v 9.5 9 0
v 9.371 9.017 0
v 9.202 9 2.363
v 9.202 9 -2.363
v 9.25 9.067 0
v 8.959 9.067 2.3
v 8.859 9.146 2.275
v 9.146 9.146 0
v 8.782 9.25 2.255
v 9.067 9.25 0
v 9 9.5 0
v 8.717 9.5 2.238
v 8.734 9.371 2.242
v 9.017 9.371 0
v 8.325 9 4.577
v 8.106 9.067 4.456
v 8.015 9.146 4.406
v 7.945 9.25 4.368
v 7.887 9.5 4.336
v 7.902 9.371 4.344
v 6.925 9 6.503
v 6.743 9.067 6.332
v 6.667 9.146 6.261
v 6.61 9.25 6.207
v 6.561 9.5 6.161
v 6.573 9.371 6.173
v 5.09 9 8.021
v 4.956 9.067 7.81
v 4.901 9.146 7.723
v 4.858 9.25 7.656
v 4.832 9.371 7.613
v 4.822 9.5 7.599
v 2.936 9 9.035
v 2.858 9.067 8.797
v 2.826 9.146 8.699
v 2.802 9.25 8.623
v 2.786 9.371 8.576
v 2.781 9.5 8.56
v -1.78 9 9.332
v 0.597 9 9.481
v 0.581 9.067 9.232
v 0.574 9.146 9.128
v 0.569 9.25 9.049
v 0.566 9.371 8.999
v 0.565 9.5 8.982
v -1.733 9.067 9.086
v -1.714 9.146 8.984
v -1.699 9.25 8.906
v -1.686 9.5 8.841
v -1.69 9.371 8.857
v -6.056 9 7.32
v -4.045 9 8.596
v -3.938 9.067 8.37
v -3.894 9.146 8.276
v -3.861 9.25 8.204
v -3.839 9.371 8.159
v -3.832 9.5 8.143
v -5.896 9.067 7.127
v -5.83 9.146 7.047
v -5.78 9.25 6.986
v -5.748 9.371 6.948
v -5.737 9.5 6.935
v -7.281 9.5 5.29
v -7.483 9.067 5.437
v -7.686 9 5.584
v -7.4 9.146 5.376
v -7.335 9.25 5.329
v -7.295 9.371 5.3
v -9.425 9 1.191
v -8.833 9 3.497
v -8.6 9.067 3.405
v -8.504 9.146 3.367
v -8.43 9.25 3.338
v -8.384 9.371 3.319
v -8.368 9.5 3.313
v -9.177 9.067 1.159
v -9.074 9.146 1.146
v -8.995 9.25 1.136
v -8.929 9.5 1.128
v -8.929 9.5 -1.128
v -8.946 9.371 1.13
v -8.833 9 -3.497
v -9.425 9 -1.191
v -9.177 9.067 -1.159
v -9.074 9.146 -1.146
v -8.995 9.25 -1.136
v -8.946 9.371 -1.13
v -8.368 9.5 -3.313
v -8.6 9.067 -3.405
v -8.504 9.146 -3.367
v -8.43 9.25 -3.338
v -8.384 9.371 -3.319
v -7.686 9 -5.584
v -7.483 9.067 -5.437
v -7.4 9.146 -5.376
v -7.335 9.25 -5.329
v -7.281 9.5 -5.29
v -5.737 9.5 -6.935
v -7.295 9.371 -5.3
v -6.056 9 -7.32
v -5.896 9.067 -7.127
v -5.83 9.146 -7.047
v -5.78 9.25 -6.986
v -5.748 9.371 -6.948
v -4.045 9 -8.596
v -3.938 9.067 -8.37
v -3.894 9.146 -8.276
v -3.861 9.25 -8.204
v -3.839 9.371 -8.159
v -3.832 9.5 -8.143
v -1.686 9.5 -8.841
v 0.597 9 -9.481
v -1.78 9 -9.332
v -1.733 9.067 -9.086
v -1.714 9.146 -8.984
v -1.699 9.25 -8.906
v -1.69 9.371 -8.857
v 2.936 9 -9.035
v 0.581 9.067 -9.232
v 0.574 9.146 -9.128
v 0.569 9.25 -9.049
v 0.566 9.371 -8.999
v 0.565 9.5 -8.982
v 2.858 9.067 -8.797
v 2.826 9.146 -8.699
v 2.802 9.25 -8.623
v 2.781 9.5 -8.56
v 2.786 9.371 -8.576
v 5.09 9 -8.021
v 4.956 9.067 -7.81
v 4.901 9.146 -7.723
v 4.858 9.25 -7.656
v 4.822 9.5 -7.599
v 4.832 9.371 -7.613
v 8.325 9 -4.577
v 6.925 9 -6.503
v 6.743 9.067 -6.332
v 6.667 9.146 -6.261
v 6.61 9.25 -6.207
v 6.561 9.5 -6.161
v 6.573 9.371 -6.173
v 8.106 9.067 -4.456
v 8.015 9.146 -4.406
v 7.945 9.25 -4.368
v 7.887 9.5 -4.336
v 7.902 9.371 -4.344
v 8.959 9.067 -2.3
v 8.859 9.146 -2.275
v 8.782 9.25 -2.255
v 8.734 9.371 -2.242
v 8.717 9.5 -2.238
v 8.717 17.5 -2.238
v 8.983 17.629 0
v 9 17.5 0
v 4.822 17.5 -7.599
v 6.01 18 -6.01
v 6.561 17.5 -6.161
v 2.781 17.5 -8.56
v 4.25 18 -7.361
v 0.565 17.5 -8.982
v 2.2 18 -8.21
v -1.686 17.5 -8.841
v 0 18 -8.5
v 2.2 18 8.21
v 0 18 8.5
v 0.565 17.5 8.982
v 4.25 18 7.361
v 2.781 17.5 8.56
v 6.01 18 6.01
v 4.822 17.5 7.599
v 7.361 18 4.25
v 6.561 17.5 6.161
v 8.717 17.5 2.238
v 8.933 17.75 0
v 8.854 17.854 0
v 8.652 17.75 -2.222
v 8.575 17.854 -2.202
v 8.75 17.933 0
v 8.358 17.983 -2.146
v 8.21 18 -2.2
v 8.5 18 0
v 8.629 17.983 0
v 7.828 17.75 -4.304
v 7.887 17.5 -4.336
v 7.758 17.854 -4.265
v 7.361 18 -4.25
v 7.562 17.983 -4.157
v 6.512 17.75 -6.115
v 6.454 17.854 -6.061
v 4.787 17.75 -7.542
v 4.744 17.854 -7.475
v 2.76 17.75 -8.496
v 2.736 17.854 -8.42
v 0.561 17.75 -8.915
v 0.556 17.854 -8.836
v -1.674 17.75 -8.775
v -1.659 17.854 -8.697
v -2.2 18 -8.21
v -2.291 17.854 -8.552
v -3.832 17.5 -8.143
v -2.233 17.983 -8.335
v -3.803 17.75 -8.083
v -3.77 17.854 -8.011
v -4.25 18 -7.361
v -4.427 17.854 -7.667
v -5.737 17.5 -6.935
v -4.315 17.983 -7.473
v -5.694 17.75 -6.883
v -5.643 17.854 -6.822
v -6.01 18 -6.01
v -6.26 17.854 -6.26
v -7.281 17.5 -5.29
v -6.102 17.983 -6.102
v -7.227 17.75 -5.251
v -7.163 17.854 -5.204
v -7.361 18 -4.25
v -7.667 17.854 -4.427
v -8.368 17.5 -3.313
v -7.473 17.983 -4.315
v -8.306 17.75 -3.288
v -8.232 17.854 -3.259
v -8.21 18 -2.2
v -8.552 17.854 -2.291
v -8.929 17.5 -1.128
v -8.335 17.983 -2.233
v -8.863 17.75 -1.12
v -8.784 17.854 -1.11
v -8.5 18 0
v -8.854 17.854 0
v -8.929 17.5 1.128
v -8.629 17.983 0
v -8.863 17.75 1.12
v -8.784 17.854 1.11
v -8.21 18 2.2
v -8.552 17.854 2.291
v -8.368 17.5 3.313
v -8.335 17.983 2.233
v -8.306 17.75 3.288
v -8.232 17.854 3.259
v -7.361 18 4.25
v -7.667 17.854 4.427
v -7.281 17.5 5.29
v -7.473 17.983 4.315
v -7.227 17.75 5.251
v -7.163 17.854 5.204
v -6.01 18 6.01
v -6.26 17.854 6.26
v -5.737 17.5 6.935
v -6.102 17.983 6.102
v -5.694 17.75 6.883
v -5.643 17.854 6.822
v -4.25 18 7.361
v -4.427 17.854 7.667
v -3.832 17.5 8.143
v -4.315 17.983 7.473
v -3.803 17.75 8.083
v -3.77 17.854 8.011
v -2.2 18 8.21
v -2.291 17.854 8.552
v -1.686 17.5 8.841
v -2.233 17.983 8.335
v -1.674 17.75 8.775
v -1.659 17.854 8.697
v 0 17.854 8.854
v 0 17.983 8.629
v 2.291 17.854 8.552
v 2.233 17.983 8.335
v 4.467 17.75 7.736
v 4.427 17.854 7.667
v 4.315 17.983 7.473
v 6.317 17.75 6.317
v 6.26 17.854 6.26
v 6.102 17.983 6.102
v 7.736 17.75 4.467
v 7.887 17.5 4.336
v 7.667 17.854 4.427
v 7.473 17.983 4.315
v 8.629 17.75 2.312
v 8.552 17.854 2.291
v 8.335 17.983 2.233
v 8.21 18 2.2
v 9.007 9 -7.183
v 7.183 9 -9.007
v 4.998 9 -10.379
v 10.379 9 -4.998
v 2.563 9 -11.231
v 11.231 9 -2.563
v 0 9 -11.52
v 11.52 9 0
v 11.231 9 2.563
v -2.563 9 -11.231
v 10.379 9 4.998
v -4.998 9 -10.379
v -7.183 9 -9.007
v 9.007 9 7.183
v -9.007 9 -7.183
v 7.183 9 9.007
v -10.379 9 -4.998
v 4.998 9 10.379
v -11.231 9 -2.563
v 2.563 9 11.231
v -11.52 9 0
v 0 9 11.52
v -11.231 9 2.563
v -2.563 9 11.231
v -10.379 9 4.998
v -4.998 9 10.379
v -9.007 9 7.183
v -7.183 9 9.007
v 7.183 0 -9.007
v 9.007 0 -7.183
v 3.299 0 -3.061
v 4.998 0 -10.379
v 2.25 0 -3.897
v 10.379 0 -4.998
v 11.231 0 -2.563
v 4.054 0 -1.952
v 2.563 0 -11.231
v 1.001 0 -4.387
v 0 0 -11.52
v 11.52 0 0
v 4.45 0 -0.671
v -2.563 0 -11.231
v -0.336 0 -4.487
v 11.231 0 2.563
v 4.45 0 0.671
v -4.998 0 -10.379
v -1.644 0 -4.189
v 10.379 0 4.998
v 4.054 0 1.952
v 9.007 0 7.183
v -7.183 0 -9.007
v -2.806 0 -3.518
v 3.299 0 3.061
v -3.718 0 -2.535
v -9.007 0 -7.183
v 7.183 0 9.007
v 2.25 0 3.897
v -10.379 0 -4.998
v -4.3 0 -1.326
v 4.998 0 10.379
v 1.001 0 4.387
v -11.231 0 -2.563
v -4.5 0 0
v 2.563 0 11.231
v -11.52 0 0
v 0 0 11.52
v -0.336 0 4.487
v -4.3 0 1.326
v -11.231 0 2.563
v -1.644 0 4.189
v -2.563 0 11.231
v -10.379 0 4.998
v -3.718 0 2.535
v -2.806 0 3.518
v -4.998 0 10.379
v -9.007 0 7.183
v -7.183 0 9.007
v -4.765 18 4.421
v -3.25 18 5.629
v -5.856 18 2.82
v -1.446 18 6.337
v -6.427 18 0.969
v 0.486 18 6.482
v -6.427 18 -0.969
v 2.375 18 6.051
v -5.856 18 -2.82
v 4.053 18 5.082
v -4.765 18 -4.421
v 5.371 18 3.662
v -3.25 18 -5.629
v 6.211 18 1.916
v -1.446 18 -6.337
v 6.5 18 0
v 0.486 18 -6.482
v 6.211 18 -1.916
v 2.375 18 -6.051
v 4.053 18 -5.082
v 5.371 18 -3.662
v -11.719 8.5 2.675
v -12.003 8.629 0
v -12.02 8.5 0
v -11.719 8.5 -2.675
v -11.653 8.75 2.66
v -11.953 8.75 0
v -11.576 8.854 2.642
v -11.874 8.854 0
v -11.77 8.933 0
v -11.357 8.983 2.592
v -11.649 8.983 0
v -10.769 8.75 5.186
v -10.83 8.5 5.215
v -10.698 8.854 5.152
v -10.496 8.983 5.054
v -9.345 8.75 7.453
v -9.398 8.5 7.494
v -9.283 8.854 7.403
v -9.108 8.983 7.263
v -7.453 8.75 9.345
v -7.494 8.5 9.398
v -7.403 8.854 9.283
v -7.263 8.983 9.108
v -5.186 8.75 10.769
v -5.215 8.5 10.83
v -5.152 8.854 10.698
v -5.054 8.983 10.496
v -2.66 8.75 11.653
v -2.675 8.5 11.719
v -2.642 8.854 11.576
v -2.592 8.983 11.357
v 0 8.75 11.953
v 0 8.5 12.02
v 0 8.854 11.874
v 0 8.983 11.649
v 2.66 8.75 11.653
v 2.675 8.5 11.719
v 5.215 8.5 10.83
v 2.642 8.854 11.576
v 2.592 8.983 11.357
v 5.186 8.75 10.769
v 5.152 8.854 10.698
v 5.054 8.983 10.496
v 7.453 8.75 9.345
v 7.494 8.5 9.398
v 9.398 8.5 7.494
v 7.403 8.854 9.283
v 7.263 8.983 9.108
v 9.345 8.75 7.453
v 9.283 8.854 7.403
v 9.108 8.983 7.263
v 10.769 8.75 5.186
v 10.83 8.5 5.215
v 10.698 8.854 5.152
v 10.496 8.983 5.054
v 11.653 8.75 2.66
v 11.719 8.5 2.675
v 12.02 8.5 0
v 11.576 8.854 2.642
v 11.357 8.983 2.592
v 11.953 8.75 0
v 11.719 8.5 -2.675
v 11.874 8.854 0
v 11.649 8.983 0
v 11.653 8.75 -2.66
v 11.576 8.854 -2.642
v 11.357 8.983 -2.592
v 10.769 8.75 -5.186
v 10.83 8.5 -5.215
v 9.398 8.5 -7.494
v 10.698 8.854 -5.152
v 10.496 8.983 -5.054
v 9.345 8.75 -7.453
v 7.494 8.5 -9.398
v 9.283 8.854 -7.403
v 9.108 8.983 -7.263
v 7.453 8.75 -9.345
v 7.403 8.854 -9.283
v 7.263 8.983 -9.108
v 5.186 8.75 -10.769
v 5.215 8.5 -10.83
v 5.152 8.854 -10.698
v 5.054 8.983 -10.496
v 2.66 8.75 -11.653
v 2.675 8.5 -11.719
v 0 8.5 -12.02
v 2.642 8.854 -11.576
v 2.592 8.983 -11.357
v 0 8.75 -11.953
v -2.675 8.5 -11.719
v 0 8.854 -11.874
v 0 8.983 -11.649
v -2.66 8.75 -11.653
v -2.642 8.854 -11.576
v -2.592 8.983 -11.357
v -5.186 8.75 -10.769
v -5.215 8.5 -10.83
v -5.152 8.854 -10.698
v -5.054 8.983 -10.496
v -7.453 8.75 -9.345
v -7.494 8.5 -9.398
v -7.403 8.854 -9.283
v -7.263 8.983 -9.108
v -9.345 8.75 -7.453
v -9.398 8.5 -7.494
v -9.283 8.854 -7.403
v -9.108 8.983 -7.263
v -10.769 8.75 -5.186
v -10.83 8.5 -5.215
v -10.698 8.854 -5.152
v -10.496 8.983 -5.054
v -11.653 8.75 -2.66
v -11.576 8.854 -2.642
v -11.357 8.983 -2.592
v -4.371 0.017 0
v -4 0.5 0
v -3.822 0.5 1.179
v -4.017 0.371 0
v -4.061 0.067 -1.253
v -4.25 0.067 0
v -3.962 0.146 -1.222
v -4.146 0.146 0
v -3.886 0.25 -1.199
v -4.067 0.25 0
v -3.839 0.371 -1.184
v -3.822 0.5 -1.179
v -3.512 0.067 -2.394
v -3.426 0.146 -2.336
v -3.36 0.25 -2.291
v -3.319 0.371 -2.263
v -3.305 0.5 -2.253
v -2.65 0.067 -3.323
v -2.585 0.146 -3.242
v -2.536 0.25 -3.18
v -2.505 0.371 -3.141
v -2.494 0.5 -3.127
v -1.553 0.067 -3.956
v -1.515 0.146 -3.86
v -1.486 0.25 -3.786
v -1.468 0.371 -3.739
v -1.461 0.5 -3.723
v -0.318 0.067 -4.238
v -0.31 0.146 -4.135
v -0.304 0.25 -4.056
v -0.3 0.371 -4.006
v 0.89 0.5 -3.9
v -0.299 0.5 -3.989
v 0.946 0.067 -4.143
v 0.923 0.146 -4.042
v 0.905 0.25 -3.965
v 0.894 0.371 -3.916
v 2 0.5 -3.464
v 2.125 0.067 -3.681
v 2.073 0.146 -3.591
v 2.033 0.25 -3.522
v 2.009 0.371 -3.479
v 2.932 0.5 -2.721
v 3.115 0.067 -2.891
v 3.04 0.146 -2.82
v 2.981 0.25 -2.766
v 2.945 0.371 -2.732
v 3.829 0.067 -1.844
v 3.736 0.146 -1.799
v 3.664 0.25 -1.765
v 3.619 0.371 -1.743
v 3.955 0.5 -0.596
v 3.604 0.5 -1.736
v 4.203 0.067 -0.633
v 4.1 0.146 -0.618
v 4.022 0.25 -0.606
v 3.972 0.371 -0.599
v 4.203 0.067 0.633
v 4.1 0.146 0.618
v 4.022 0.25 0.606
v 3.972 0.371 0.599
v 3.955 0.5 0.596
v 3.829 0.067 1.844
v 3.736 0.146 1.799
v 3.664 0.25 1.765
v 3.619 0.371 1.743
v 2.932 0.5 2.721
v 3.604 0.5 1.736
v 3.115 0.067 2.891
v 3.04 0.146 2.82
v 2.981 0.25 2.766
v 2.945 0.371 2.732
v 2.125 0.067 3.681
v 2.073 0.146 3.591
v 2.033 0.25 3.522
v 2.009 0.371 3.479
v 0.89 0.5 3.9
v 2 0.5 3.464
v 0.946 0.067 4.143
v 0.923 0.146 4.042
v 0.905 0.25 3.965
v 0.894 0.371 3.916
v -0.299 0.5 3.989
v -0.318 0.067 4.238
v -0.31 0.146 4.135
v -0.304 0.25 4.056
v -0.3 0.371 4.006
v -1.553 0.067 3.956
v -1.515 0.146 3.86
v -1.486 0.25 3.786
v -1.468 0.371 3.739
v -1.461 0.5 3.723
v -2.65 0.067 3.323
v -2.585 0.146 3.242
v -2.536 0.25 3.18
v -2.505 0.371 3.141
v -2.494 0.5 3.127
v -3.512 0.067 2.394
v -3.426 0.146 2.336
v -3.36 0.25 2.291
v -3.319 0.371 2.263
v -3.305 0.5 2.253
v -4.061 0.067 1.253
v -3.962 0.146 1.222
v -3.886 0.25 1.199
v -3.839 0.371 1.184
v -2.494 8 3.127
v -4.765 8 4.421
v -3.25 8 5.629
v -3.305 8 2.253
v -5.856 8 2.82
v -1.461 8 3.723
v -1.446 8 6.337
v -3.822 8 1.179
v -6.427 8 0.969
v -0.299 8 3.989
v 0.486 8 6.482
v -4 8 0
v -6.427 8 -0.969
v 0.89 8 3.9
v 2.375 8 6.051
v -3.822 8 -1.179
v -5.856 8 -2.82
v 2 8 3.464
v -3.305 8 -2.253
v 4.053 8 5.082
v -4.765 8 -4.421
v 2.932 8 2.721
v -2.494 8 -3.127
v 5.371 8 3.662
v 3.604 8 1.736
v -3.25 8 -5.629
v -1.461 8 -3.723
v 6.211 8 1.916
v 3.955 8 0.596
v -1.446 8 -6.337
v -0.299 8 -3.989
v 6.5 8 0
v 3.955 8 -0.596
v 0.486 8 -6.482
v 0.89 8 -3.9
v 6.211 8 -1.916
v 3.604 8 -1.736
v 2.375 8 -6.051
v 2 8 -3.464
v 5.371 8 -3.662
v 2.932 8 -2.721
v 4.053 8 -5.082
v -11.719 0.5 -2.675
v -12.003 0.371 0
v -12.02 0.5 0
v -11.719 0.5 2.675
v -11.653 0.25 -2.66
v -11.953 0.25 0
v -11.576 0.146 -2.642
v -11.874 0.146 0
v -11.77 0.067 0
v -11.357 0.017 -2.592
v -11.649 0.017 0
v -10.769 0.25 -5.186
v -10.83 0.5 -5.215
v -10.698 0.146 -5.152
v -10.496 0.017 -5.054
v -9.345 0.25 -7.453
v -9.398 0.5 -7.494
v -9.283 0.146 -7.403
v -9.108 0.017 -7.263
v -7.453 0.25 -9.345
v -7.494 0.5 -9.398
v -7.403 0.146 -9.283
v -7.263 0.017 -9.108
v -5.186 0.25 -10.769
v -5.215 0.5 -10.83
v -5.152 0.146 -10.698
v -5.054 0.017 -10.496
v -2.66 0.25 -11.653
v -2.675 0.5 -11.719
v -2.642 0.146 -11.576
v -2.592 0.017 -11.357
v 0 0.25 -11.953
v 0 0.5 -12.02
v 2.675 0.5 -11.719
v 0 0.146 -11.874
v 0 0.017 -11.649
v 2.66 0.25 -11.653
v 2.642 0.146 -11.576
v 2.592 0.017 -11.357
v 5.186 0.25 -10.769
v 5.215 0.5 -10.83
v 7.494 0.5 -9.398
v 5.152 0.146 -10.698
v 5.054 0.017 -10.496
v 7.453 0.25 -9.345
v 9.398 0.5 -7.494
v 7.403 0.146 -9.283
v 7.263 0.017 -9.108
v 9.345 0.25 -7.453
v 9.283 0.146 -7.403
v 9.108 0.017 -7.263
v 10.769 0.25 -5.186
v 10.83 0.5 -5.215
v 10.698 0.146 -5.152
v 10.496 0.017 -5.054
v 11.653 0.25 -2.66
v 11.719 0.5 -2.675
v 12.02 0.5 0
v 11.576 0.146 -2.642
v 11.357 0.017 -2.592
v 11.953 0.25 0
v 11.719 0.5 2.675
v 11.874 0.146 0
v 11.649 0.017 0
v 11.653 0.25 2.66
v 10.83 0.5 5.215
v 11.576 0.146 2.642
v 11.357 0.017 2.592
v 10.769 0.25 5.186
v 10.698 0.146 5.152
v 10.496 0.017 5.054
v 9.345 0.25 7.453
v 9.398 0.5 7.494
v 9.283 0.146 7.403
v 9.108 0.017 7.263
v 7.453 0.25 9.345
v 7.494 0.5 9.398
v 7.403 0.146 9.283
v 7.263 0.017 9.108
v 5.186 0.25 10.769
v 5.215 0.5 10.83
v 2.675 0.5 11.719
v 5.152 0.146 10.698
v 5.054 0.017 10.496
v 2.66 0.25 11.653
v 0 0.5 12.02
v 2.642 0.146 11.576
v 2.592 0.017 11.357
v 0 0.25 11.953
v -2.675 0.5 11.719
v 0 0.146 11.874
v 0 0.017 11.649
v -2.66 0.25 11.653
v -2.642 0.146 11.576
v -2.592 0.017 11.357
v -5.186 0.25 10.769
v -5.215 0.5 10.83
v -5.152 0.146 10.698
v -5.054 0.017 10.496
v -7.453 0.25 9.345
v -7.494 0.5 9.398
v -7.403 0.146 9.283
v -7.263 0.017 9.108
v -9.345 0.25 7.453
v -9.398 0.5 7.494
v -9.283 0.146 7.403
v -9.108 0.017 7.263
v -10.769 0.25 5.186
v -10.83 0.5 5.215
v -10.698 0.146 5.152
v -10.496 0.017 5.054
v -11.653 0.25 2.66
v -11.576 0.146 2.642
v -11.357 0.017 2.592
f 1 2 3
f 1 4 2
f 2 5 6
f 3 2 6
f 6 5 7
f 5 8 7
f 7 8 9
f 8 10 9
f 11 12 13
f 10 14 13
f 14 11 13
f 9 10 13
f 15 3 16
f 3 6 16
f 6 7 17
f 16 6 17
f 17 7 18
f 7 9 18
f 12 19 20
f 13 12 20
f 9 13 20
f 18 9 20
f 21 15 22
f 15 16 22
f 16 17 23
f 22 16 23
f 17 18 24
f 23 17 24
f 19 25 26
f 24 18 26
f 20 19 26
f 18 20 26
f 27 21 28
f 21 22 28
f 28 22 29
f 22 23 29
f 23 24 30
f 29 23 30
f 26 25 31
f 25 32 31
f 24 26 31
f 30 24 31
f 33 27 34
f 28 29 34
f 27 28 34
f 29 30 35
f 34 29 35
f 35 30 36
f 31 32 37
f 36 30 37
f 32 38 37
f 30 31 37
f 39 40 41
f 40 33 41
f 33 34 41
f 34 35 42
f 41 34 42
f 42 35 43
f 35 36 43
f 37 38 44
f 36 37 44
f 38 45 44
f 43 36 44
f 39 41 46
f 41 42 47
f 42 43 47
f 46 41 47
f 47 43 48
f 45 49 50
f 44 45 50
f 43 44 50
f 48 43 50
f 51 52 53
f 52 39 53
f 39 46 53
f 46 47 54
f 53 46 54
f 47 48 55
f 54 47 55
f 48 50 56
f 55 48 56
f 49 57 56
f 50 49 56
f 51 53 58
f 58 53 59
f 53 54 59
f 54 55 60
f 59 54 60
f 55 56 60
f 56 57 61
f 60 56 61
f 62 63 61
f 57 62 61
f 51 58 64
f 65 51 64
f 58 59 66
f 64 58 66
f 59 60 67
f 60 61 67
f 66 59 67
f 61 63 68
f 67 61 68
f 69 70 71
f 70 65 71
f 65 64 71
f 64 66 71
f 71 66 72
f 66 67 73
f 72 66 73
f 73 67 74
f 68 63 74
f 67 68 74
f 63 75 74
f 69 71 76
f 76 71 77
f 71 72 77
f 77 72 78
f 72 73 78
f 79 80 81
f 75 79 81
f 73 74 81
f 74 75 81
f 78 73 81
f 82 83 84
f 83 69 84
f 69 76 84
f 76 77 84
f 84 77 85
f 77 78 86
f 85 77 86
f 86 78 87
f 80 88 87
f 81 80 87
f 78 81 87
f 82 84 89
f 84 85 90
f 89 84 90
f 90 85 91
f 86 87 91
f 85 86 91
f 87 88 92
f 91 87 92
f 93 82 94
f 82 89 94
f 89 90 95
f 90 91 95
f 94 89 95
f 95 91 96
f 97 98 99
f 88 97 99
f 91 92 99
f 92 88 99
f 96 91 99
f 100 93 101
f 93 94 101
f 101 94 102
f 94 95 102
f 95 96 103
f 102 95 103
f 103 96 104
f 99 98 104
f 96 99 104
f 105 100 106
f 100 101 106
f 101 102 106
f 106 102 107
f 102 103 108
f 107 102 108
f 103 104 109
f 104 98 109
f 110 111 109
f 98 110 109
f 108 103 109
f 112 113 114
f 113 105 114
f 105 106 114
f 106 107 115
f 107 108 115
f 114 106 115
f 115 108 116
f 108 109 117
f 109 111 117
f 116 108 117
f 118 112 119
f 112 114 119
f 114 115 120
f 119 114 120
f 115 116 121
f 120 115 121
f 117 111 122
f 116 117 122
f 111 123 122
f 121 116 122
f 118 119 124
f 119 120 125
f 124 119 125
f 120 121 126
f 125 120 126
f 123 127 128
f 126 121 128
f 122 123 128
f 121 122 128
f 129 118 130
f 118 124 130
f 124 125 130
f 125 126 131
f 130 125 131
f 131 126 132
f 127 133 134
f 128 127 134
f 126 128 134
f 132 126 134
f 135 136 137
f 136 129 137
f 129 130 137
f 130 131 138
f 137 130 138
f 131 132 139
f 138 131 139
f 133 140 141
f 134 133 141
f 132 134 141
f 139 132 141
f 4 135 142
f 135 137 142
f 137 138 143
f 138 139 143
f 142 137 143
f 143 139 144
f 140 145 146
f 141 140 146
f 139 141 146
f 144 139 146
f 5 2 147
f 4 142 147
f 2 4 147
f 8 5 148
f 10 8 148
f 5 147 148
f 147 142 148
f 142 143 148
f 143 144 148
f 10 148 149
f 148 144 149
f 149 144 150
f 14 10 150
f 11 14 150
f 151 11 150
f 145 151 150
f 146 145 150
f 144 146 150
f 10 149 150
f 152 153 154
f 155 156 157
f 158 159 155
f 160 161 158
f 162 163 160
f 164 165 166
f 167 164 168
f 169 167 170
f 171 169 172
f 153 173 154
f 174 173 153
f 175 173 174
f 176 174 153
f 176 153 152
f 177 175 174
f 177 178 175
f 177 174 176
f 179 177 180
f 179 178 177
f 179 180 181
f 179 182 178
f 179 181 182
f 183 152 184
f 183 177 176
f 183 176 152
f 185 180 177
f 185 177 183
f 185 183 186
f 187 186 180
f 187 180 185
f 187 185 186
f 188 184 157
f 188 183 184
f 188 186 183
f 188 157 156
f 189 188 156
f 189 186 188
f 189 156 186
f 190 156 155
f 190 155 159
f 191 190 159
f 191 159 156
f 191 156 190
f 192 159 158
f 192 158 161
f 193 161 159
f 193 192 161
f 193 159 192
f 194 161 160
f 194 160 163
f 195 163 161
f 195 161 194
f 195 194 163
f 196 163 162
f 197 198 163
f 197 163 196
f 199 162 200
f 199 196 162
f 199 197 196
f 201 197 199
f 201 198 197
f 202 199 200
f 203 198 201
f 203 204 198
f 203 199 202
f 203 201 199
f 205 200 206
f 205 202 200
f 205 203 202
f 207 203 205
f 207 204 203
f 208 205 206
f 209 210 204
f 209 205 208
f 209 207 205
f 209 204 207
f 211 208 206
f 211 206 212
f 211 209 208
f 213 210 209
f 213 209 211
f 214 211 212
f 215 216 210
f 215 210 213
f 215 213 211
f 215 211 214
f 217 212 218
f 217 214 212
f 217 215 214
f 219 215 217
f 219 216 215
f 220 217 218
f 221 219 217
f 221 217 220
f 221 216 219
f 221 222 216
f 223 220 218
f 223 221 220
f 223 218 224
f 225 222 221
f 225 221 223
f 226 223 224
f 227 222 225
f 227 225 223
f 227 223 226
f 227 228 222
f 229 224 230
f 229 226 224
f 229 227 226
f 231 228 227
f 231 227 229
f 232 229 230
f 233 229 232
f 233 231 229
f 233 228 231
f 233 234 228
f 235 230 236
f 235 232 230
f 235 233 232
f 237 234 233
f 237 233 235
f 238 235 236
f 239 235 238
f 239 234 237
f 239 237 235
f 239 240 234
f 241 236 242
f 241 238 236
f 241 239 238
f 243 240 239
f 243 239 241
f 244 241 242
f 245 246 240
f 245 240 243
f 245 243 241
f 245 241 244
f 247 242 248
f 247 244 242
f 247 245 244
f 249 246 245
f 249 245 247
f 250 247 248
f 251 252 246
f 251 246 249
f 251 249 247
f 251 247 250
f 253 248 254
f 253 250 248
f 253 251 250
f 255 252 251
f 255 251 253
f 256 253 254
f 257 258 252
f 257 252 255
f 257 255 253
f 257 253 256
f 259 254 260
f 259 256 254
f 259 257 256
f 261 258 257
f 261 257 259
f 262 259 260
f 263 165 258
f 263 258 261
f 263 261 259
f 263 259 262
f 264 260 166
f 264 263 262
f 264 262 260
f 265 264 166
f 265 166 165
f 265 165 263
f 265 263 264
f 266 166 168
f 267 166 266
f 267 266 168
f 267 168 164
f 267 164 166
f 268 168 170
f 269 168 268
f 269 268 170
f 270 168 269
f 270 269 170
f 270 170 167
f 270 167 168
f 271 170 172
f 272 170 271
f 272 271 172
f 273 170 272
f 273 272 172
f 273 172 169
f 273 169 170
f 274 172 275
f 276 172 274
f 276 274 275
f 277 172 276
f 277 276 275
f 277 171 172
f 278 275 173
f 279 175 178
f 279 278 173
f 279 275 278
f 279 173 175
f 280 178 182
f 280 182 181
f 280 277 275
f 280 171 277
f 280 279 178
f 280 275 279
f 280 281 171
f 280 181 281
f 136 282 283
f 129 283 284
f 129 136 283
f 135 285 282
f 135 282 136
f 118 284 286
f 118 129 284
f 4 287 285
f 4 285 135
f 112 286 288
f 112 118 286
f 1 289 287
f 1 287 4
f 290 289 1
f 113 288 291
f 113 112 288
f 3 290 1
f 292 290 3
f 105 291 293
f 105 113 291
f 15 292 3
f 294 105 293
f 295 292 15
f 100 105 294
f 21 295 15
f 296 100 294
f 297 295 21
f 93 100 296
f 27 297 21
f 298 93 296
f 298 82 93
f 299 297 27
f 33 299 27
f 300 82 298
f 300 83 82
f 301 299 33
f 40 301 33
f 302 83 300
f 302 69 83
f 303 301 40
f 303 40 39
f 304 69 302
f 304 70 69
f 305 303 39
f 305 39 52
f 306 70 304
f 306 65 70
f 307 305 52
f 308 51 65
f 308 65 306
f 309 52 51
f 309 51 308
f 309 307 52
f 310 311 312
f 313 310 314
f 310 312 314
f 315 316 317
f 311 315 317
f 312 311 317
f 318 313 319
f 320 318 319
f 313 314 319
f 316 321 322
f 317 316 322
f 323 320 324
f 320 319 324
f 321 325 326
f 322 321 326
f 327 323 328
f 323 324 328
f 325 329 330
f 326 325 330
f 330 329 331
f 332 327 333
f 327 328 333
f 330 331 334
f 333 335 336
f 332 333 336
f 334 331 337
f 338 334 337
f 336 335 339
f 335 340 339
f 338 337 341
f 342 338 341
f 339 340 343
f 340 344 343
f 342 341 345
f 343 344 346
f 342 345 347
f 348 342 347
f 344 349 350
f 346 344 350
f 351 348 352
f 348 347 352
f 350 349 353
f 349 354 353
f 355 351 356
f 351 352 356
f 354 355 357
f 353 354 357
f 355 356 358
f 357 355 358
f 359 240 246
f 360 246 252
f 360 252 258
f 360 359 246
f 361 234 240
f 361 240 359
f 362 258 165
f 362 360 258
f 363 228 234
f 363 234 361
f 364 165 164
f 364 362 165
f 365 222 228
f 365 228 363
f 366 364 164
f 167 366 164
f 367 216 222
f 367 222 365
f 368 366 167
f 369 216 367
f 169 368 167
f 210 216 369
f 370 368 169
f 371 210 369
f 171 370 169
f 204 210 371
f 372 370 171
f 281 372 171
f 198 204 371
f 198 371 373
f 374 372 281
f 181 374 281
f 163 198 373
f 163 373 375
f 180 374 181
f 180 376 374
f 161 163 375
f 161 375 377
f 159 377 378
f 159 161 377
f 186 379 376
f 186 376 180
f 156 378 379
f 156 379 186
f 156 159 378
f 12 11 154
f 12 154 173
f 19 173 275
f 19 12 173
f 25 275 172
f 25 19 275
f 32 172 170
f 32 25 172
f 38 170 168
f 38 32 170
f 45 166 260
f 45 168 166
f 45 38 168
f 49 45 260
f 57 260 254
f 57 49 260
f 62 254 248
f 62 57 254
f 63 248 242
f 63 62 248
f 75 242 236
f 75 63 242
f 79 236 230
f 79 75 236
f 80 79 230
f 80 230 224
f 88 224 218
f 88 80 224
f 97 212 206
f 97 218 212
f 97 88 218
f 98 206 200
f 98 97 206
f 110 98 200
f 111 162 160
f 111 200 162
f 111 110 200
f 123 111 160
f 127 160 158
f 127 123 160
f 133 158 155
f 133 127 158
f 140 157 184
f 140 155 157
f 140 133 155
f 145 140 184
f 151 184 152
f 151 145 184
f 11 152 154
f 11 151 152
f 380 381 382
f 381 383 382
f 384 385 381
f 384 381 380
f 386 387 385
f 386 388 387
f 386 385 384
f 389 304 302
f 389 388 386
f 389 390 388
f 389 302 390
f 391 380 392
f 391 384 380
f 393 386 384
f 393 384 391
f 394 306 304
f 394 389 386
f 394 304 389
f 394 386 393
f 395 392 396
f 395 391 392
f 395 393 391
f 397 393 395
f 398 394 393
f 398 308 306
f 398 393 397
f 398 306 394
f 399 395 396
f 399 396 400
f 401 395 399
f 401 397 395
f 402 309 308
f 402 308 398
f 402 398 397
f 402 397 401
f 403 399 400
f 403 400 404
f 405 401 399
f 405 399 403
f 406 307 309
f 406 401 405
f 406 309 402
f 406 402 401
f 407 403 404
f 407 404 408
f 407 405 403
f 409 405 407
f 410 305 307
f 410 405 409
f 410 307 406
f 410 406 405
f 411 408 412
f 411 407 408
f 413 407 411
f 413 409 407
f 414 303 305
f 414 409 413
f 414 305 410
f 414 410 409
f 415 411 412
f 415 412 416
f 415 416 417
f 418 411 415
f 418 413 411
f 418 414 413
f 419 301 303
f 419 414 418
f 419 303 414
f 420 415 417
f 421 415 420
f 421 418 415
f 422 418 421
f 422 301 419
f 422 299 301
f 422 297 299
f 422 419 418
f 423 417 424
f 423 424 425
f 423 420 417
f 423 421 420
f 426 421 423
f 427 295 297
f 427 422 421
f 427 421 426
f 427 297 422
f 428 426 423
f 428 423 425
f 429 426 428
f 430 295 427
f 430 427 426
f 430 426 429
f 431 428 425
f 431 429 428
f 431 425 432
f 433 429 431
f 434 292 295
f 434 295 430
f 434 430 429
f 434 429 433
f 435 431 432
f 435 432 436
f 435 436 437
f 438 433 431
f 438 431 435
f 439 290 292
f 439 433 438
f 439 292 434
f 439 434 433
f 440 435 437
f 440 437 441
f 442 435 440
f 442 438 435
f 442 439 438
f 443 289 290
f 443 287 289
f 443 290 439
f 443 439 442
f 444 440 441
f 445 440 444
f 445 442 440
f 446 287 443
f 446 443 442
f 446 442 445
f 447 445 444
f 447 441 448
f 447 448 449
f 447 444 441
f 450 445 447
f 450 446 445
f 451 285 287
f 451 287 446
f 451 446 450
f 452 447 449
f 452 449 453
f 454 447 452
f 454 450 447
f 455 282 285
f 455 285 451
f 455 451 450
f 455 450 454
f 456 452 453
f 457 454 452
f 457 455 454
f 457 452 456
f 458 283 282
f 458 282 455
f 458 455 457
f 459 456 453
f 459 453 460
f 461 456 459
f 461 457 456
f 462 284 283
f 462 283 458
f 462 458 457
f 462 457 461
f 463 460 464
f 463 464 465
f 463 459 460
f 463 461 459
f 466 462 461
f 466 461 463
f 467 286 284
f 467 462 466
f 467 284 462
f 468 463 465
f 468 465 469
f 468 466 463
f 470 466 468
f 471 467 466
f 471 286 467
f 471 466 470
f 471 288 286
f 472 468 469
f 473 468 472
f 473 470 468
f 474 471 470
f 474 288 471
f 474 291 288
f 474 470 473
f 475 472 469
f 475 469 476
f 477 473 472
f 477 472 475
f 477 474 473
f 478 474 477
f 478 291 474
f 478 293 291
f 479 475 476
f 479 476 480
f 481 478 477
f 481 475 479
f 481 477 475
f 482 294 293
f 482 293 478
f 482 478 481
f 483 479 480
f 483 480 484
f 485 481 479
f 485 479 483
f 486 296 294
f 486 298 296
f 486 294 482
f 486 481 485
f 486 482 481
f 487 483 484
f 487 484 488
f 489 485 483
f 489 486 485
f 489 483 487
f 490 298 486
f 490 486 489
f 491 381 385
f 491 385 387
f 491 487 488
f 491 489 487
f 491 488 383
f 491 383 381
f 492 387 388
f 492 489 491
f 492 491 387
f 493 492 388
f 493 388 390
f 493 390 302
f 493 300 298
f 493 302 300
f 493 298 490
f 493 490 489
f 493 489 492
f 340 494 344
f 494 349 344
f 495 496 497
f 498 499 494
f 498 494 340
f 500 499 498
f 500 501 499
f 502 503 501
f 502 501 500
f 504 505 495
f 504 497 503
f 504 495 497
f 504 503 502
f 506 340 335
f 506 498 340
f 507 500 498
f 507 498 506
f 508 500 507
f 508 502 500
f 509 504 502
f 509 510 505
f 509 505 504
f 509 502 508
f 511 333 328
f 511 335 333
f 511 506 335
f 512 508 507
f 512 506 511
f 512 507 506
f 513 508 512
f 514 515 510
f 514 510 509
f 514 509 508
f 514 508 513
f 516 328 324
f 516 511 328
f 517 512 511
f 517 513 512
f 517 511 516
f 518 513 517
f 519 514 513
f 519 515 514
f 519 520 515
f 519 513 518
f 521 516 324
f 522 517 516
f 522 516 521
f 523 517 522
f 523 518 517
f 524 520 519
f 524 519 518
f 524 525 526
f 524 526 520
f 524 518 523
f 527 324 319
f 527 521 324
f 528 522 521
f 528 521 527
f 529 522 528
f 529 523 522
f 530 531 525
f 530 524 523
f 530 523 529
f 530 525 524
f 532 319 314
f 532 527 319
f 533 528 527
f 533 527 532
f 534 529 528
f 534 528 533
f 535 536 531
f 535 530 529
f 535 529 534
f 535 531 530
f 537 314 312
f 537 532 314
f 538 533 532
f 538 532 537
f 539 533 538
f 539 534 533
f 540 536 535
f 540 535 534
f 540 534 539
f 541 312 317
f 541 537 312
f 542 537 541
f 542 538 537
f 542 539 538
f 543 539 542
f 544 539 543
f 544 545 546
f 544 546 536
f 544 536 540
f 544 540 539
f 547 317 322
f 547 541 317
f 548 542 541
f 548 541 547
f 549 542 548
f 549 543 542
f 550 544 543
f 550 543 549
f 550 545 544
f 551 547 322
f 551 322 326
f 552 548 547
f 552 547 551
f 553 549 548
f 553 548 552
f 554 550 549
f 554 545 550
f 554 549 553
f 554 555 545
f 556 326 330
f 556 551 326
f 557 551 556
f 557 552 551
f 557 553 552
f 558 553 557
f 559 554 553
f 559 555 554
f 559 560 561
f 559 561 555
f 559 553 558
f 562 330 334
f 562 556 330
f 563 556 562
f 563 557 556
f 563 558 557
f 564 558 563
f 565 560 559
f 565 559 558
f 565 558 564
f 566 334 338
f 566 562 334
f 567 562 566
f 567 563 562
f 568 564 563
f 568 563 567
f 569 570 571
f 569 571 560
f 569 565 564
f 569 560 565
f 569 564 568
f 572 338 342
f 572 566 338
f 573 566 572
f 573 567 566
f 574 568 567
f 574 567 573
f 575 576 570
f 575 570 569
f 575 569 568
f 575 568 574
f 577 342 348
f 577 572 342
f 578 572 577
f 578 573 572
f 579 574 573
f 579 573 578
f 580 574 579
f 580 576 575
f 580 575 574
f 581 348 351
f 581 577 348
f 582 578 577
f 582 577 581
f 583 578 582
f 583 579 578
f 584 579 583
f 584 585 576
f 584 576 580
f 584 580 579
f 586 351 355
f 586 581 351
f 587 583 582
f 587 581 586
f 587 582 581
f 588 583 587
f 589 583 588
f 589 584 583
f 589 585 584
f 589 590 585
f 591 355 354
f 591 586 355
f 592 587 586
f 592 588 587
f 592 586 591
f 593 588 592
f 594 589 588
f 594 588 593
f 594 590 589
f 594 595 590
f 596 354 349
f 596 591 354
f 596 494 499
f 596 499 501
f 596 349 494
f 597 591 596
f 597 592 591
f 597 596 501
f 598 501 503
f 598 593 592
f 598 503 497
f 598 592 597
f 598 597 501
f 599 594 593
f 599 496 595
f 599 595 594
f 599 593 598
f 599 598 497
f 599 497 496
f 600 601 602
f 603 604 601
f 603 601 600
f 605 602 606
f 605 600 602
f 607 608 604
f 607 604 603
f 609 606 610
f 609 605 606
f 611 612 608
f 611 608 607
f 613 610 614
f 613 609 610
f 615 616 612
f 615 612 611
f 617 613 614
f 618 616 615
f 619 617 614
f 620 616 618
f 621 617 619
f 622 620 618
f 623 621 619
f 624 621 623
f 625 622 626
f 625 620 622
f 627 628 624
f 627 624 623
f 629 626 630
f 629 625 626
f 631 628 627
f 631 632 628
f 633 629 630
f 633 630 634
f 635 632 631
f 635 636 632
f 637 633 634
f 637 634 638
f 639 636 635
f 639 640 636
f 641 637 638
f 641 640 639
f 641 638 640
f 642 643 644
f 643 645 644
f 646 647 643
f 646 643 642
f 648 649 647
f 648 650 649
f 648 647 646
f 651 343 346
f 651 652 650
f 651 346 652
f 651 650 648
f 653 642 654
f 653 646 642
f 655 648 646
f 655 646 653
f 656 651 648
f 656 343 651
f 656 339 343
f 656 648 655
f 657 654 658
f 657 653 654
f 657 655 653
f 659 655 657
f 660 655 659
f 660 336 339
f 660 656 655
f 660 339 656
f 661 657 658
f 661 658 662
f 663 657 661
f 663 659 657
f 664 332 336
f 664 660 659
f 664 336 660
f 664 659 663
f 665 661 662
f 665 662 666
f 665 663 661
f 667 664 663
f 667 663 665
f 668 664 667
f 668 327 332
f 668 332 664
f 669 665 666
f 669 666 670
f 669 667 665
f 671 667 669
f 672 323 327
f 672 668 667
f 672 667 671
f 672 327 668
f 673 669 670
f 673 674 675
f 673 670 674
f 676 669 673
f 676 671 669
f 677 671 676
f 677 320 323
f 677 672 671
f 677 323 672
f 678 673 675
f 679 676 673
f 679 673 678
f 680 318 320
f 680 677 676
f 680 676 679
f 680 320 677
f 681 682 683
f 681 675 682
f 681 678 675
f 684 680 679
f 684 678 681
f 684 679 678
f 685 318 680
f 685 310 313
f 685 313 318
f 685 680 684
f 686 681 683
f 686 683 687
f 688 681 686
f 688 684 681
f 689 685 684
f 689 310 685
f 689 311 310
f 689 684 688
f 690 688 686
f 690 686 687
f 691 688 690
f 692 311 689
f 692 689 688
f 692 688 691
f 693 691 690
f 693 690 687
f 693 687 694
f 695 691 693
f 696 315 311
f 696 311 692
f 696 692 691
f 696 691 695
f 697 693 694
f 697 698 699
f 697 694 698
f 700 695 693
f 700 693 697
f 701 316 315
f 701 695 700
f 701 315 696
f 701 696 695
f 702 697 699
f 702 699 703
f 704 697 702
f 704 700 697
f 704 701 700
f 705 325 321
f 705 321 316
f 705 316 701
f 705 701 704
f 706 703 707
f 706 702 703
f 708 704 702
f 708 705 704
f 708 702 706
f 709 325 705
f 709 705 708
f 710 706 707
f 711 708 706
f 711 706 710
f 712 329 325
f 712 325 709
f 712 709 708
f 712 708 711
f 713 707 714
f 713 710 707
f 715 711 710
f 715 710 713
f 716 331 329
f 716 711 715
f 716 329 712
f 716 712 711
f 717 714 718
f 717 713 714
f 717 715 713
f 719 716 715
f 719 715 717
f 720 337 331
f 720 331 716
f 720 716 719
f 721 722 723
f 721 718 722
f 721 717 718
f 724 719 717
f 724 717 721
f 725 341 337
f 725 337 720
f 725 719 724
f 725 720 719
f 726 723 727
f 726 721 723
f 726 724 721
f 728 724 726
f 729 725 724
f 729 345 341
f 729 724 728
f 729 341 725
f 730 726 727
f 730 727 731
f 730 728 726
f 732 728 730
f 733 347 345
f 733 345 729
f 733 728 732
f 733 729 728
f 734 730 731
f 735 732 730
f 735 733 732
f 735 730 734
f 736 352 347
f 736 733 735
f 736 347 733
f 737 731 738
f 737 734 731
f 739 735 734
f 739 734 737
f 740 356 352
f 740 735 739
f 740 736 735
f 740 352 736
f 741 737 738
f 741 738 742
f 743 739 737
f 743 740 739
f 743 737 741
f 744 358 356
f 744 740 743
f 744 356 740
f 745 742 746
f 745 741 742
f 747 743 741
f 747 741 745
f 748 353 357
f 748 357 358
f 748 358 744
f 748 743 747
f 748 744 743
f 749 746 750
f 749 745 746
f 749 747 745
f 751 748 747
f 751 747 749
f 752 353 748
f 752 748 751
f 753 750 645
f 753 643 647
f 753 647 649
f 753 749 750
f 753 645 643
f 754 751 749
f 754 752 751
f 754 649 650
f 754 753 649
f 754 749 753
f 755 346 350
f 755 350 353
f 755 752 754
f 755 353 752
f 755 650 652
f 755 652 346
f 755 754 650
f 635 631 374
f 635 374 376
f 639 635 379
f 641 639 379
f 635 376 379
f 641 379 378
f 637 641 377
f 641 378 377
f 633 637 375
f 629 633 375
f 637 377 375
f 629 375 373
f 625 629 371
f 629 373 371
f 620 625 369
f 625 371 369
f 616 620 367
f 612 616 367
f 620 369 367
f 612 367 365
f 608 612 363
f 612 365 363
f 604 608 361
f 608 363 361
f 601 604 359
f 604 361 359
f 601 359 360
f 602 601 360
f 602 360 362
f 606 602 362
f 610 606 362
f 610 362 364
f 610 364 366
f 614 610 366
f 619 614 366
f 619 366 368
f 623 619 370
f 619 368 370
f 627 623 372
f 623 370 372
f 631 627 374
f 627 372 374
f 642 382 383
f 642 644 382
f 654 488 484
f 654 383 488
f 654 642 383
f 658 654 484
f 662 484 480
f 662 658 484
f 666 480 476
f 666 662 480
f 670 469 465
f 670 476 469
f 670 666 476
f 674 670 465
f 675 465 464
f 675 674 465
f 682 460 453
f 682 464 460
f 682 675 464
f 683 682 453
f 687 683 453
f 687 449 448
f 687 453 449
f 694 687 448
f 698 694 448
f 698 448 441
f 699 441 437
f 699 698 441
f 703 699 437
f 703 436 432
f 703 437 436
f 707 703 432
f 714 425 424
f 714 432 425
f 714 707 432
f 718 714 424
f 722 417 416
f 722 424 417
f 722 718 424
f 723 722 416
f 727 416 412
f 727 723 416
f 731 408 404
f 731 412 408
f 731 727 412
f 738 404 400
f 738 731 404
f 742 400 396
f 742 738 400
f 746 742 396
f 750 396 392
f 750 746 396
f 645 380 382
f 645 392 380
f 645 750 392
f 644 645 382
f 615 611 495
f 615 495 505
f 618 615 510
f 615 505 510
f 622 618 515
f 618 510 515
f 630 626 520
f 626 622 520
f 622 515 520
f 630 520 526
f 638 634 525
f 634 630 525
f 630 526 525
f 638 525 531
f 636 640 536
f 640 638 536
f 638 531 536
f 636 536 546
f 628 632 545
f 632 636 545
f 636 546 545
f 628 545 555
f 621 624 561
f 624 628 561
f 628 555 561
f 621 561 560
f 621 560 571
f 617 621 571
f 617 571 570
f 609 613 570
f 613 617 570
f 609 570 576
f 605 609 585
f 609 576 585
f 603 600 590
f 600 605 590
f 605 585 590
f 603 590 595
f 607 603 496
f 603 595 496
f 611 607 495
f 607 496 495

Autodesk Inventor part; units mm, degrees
ref_plane "YZ Plane" through (0, 0, 0) normal (1, 0, 0) x (0, 1, 0)
ref_plane "XZ Plane" through (0, 0, 0) normal (0, 1, 0) x (-1, 0, 0)
ref_plane "XY Plane" through (0, 0, 0) normal (0, 0, 1) x (1, 0, 0)
sketch "Sketch1" plane through (0, 0, 0) normal (0, 1, 0) x (-1, 0, 0)
  circle A0 centre (0, 0) radius 12.02
  circle A1 centre (0, 0) radius 4
  dimension "d0" = 24.04
  dimension "d1" = 8
extrude "Extrusion1" add sketch "Sketch1" along normal blind 9
sketch "Sketch2" plane through (0, 9, 0) normal (0, 1, 0) x (1, 0, 0)
  circle A0 centre (0, 0) radius 4
  circle A1 centre (0, 0) radius 9
  circle A2 centre (0, 0) radius 4 projected
  dimension "d4" = 18
extrude "Extrusion2" add sketch "Sketch2" along normal blind 9
sketch "Sketch3" plane through (0, 18, 0) normal (0, 1, 0) x (1, 0, 0)
  circle A0 centre (0, 0) radius 6.5
  dimension "d7" = 13
extrude "Extrusion3" cut sketch "Sketch3" against normal blind 10
fillet "Fillet1" radius 0.5 5 edges at (4, 0, 0) (12.02, 0, 0) (12.02, 9, 0) (-9, 9, 0) (-9, 18, 0)
properties part number "Z-Zahnrad"
